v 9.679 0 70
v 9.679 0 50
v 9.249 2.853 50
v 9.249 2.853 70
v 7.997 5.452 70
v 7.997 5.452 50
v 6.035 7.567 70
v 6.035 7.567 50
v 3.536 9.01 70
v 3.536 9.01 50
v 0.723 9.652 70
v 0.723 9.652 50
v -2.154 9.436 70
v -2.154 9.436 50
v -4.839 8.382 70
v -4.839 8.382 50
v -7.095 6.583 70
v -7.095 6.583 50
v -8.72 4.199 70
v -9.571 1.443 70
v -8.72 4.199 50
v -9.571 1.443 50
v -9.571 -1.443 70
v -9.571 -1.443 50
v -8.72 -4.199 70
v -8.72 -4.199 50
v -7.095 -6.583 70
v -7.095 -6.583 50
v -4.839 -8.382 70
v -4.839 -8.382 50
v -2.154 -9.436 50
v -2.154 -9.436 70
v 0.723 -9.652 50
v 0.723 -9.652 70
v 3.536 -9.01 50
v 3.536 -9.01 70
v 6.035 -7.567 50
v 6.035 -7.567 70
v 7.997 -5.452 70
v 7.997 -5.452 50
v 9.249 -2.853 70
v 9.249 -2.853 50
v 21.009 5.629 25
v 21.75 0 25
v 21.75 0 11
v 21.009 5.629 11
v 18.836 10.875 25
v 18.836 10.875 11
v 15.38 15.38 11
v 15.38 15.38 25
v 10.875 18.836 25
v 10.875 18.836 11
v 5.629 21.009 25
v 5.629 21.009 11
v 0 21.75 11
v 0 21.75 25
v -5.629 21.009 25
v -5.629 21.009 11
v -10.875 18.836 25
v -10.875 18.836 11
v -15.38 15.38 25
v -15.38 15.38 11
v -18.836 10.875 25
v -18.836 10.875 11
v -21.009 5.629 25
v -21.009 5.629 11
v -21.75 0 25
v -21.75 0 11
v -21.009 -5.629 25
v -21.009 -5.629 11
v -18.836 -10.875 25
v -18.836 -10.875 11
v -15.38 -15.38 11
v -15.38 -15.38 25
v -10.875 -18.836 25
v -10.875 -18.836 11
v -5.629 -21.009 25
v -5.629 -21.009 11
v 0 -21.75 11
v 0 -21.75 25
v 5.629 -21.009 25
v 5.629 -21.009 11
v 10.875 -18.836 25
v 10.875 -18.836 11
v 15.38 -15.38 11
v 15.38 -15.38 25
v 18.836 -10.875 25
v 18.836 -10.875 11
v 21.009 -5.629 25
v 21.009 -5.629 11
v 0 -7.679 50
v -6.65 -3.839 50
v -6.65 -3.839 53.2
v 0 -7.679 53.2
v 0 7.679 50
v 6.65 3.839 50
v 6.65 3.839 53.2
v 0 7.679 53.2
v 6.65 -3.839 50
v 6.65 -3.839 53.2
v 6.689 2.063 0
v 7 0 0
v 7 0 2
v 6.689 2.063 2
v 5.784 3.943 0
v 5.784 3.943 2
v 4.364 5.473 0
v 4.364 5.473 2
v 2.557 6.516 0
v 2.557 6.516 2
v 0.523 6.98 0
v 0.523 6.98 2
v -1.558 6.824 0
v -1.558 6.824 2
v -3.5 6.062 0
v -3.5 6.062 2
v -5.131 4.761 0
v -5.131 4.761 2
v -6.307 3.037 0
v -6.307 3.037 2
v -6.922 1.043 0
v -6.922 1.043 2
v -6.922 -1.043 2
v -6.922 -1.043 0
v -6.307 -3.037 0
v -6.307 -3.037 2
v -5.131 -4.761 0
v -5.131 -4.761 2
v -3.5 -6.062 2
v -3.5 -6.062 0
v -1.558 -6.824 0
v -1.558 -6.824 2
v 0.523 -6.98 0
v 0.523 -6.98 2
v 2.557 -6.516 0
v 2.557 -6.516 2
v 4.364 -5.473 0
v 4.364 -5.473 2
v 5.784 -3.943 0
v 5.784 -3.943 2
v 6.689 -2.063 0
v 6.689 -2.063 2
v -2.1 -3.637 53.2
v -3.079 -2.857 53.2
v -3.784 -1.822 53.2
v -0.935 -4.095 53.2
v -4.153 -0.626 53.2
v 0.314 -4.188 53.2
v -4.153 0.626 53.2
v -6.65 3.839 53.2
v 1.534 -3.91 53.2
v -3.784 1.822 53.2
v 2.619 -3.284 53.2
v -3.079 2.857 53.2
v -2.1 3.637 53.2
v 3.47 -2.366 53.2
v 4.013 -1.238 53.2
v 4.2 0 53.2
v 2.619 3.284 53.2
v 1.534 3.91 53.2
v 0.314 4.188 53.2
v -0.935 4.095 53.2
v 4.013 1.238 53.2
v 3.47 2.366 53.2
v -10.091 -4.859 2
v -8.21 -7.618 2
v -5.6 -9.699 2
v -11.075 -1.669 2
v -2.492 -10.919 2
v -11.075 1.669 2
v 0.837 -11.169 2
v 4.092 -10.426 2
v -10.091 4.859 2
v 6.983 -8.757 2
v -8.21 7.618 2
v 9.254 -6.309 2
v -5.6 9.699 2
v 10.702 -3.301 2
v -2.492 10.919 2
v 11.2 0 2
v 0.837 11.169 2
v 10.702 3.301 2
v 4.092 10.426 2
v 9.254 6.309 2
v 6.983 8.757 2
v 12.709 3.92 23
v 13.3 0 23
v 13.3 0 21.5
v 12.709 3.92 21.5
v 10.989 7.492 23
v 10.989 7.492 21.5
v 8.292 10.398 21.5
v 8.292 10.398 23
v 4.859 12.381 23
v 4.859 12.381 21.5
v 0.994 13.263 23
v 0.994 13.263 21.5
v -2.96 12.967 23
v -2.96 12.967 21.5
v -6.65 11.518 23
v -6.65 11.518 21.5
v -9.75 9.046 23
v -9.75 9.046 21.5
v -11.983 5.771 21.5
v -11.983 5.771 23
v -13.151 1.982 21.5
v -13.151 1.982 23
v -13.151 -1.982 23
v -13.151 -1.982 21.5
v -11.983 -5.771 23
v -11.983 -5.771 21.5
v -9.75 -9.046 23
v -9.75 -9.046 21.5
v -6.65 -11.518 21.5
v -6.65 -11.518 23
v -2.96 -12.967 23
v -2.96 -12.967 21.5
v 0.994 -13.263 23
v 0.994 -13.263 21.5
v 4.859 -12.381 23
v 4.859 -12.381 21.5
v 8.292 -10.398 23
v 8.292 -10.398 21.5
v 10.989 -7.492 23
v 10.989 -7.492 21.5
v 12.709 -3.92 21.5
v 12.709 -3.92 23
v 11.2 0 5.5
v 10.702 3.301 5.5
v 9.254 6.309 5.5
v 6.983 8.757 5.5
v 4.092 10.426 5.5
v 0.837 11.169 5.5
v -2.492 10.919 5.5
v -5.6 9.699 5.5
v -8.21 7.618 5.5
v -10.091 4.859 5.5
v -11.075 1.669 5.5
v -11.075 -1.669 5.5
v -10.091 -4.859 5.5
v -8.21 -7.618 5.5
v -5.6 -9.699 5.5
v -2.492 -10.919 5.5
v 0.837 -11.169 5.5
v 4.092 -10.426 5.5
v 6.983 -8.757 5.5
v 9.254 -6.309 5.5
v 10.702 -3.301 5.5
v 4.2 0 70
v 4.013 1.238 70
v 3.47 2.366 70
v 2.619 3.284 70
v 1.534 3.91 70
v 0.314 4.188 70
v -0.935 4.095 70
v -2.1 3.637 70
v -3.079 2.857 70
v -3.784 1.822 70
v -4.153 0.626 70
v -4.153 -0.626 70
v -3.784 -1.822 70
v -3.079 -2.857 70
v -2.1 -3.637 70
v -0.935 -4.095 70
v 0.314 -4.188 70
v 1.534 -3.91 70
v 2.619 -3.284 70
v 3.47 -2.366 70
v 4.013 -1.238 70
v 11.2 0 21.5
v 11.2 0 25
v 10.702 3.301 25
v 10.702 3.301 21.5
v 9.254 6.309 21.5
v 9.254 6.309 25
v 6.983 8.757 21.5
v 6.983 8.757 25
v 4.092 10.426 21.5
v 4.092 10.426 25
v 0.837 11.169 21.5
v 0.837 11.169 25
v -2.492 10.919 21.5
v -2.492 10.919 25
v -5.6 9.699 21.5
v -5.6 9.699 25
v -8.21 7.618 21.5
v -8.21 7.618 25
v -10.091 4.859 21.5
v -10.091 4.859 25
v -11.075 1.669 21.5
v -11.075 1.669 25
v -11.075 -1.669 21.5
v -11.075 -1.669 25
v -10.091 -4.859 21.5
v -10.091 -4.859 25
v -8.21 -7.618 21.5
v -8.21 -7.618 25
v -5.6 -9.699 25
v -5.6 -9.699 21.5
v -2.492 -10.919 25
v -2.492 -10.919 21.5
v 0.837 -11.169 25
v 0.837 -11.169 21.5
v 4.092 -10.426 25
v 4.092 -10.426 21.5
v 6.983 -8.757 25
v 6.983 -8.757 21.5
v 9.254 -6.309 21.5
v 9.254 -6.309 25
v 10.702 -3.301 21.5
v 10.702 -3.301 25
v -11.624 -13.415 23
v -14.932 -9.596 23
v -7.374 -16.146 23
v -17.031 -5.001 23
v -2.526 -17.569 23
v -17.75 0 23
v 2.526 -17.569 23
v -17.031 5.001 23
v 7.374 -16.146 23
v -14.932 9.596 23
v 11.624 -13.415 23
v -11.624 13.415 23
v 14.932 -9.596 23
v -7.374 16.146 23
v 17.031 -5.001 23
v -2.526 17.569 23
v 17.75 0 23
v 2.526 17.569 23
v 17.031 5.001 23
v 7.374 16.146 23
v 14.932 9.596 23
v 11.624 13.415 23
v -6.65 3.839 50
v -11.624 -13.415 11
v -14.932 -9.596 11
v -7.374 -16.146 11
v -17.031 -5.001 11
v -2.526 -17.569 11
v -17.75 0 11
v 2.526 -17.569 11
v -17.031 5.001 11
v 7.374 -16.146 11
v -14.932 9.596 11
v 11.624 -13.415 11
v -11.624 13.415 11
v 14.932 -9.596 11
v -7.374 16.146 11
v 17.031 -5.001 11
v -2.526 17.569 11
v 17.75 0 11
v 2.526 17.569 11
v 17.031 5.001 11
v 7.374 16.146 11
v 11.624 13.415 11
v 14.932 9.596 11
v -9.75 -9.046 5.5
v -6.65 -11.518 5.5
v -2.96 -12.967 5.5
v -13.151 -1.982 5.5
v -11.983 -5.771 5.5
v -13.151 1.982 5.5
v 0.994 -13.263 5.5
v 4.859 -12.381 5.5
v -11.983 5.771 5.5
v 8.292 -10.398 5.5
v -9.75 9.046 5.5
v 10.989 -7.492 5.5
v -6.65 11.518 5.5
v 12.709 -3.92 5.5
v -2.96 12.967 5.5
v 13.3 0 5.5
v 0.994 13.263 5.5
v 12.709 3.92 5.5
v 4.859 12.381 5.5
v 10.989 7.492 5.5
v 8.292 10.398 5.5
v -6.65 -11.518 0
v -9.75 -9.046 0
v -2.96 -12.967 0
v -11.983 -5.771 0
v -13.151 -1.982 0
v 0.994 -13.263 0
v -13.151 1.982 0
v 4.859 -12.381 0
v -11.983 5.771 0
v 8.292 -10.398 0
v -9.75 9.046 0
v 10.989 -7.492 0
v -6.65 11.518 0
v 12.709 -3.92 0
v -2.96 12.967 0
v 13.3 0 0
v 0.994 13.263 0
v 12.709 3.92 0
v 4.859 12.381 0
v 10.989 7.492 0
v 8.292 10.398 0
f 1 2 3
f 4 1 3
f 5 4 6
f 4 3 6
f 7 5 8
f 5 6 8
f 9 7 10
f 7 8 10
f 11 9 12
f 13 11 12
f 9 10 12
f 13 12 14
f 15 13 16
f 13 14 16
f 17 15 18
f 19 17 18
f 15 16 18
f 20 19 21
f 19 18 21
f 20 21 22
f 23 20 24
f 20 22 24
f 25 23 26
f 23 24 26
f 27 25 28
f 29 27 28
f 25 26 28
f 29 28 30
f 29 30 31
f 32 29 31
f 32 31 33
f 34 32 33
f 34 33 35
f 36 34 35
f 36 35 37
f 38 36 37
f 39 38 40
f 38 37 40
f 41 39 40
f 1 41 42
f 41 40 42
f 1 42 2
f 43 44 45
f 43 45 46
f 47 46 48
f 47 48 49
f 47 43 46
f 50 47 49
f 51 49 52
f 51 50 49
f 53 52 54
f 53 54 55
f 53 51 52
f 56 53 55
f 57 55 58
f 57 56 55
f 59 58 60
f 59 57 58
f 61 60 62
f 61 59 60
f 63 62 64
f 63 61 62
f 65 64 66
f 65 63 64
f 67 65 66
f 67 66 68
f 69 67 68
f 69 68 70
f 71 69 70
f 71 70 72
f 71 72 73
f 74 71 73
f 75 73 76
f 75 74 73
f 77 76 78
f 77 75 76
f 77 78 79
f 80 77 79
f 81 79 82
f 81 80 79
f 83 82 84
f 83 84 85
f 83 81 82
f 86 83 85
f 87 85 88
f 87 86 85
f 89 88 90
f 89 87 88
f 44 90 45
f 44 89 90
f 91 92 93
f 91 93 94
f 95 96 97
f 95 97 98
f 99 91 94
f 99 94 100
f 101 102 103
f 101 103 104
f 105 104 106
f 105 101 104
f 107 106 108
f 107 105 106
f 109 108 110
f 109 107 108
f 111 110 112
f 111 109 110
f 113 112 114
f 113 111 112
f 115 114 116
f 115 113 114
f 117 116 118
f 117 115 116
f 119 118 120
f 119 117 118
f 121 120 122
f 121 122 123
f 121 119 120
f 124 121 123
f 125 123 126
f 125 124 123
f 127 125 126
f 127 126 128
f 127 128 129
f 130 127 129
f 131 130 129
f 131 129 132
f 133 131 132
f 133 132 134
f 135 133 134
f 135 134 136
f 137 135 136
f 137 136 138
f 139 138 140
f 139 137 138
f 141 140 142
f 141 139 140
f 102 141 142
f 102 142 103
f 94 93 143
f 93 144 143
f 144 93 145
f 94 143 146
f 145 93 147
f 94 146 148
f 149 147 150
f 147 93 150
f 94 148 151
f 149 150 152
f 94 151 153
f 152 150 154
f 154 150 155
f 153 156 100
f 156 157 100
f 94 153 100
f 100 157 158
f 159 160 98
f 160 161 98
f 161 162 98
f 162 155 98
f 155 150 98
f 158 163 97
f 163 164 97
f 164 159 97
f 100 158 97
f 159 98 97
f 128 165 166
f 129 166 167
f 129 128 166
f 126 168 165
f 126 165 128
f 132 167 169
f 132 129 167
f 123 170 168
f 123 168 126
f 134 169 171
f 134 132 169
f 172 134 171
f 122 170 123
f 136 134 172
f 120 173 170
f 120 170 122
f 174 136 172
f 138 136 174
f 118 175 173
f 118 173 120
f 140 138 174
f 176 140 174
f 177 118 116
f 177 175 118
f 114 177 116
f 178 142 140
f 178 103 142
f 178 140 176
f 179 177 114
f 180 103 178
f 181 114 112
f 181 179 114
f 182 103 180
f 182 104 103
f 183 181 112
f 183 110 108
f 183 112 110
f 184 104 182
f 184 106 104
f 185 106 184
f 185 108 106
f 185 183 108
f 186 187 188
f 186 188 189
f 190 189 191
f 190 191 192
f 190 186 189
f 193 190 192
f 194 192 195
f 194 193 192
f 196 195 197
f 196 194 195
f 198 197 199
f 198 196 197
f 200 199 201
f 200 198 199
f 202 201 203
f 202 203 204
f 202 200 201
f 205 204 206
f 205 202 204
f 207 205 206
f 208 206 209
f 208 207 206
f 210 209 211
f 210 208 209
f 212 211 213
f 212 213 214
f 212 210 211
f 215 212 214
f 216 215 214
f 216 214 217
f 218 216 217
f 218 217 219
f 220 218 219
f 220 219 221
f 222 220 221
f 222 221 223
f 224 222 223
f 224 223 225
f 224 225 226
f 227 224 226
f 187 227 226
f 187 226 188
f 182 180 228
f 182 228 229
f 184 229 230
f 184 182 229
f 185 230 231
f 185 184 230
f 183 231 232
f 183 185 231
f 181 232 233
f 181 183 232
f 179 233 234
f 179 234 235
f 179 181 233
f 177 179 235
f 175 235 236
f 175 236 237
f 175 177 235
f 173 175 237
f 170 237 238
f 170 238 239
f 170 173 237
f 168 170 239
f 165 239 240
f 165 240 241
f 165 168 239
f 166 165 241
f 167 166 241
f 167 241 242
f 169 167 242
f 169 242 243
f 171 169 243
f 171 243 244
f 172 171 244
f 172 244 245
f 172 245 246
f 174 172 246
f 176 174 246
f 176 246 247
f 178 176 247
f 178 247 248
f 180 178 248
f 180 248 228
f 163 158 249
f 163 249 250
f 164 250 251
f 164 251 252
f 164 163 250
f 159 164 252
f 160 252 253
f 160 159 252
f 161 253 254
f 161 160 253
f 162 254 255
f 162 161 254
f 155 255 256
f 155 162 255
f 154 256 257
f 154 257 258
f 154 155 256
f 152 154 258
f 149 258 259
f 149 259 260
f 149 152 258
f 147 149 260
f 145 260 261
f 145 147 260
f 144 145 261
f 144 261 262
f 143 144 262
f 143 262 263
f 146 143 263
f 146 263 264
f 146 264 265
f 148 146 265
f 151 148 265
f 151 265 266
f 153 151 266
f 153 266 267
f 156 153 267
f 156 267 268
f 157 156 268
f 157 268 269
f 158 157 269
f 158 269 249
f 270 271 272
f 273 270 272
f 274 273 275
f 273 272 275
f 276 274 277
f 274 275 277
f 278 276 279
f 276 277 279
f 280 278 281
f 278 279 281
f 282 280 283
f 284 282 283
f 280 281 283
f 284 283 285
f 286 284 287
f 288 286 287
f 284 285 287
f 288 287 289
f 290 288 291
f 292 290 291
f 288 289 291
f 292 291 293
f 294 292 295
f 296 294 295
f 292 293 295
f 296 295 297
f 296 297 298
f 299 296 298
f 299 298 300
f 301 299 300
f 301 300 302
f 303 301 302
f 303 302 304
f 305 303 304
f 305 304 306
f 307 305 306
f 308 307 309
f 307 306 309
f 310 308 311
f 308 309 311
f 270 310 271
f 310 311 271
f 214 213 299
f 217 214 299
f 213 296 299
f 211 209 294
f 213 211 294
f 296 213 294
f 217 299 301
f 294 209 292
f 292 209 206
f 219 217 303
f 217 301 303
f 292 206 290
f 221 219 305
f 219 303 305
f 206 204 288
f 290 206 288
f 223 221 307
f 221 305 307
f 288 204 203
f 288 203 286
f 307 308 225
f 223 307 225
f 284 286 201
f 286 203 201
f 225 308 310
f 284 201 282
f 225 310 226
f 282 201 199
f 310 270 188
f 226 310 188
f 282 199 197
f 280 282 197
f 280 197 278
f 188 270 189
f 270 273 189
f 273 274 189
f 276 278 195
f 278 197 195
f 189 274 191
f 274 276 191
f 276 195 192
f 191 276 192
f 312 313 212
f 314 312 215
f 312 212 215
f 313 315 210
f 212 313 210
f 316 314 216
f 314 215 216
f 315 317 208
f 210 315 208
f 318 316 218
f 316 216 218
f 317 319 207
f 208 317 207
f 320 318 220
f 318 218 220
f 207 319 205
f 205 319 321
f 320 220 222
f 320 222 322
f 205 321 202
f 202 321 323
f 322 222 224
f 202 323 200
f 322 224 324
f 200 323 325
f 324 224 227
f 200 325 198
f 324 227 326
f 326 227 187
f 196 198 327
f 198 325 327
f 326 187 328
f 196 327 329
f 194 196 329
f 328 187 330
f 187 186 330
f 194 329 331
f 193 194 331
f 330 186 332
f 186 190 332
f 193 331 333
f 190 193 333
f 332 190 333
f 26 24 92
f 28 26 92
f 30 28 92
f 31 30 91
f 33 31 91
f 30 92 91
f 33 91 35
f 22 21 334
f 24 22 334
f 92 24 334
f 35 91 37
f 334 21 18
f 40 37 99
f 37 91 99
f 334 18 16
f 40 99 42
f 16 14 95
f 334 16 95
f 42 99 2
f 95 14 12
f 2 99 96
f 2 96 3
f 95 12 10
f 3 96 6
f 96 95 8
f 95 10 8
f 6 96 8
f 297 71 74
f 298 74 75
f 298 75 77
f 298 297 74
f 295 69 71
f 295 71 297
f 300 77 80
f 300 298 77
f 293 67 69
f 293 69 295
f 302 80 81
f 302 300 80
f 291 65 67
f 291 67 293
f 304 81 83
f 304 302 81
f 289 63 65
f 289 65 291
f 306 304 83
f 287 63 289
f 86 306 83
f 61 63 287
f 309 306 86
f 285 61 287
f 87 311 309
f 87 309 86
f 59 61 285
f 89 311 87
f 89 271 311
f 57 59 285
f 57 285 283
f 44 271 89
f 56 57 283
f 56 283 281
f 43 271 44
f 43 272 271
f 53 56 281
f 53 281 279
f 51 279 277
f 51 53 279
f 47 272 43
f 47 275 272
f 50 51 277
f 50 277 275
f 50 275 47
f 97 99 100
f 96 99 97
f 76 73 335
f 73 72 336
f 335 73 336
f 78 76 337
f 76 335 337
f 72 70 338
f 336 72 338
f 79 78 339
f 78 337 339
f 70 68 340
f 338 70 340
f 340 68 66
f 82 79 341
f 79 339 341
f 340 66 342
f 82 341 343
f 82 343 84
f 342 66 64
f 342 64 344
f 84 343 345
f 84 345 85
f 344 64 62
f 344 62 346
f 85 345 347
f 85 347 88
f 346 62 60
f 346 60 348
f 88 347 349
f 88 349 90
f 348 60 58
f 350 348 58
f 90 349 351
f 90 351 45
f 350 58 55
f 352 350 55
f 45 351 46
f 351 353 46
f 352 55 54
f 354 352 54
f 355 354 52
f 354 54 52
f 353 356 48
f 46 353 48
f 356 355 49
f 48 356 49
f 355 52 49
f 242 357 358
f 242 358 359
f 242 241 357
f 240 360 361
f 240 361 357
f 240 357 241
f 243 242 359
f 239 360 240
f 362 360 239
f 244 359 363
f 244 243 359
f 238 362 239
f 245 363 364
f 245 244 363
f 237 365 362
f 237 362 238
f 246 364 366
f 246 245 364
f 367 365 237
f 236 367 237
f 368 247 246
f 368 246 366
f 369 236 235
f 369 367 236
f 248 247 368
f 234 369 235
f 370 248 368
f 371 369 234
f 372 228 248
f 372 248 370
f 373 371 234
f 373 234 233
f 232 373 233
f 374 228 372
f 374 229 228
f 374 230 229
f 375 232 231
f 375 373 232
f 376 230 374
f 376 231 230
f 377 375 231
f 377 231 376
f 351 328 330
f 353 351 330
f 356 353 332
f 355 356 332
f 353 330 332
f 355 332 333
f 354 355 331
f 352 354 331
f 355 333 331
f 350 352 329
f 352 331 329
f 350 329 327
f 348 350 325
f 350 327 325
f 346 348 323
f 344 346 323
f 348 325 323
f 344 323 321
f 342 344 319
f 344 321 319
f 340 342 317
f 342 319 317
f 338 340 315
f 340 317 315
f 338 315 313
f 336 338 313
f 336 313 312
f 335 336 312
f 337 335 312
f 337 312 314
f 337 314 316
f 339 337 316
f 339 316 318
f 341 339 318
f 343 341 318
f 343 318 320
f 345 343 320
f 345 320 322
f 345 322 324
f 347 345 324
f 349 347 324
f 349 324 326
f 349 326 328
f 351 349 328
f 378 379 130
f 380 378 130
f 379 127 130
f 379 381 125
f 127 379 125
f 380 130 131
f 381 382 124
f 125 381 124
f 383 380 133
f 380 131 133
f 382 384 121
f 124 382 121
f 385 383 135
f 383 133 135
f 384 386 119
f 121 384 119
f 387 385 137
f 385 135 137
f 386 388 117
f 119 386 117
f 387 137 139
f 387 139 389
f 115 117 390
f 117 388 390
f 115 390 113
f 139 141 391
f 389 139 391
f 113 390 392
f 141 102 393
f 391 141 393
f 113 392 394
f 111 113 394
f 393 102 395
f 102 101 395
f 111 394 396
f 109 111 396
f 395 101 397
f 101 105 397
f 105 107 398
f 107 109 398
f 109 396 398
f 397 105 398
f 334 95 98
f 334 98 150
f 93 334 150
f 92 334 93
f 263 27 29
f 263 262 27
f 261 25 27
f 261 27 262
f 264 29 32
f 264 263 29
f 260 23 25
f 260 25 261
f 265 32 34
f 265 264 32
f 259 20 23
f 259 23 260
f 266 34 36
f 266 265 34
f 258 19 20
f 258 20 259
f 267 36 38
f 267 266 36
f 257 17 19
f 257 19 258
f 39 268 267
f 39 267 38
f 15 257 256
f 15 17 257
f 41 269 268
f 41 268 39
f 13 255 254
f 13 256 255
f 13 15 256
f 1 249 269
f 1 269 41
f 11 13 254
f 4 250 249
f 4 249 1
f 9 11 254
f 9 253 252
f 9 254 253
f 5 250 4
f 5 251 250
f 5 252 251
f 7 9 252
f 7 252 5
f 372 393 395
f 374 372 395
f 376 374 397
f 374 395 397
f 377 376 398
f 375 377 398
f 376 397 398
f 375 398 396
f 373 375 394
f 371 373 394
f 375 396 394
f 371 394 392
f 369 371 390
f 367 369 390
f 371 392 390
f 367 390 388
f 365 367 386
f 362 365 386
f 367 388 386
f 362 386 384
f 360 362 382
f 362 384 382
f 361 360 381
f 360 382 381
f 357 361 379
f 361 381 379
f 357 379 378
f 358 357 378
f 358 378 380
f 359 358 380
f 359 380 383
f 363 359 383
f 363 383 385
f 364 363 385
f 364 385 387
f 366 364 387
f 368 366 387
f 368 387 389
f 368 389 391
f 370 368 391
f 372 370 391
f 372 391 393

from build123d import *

# Parameters (mm, degrees)
F4_R      = 13.3
F4_R_2    = 11.2
F4_R_3    = 7
F5_DEPTH  = 2
F6_DEPTH  = 5.5
F8_R      = 13.3
F8_R_2    = 11.2
F9_DEPTH  = 3.5
F8_R_3    = 17.75
F10_DEPTH = 2
F8_R_4    = 21.75
F11_DEPTH = 14
F13_R     = 9.6787585802
F13_R_2   = 4.2
F14_DEPTH = 20
F15_DEPTH = 3.2


with BuildPart() as f5:
    # F4 (on Top) → F5 (new body)
    with BuildSketch(Plane.XY):
        Circle(F4_R)
        Circle(F4_R_2, mode=Mode.SUBTRACT)
        Circle(F4_R_2)
        Circle(F4_R_3, mode=Mode.SUBTRACT)
    extrude(amount=F5_DEPTH)

    # F4 (on Top) → F6 (join)
    with BuildSketch(Plane.XY):
        Circle(F4_R)
        Circle(F4_R_2, mode=Mode.SUBTRACT)
    extrude(amount=F6_DEPTH)


with BuildPart() as f9:
    # F8 (on offset) → F9 (new body)
    with BuildSketch(Plane.XY.offset(25)):
        Circle(F8_R)
        Circle(F8_R_2, mode=Mode.SUBTRACT)
    extrude(amount=-F9_DEPTH)

    # F8 (on offset) → F10 (join)
    with BuildSketch(Plane.XY.offset(25)):
        Circle(F8_R_3)
        Circle(F8_R, mode=Mode.SUBTRACT)
    extrude(amount=-F10_DEPTH)

    # F8 (on offset) → F11 (join)
    with BuildSketch(Plane.XY.offset(25)):
        Circle(F8_R_4)
        Circle(F8_R_3, mode=Mode.SUBTRACT)
    extrude(amount=-F11_DEPTH)


with BuildPart() as f14:
    # F13 (on offset) → F14 (new body)
    with BuildSketch(Plane.XY.offset(50)):
        Circle(F13_R)
        Polygon((0, 7.6787585802), (6.65, 3.8393792901), (6.65, -3.8393792901), (0, -7.6787585802), (-6.65, -3.8393792901), (-6.65, 3.8393792901), align=None, mode=Mode.SUBTRACT)
        Polygon((6.65, -3.8393792901), (6.65, 3.8393792901), (0, 7.6787585802), (-6.65, 3.8393792901), (-6.65, -3.8393792901), (0, -7.6787585802), align=None)
        Circle(F13_R_2, mode=Mode.SUBTRACT)
    extrude(amount=F14_DEPTH)

    # F13 (on offset) → F15 (cut)
    with BuildSketch(Plane.XY.offset(50)):
        Polygon((6.65, -3.8393792901), (6.65, 3.8393792901), (0, 7.6787585802), (-6.65, 3.8393792901), (-6.65, -3.8393792901), (0, -7.6787585802), align=None)
        Circle(F13_R_2, mode=Mode.SUBTRACT)
    extrude(amount=F15_DEPTH, mode=Mode.SUBTRACT)


solid = Compound([f5.part, f9.part, f14.part])
